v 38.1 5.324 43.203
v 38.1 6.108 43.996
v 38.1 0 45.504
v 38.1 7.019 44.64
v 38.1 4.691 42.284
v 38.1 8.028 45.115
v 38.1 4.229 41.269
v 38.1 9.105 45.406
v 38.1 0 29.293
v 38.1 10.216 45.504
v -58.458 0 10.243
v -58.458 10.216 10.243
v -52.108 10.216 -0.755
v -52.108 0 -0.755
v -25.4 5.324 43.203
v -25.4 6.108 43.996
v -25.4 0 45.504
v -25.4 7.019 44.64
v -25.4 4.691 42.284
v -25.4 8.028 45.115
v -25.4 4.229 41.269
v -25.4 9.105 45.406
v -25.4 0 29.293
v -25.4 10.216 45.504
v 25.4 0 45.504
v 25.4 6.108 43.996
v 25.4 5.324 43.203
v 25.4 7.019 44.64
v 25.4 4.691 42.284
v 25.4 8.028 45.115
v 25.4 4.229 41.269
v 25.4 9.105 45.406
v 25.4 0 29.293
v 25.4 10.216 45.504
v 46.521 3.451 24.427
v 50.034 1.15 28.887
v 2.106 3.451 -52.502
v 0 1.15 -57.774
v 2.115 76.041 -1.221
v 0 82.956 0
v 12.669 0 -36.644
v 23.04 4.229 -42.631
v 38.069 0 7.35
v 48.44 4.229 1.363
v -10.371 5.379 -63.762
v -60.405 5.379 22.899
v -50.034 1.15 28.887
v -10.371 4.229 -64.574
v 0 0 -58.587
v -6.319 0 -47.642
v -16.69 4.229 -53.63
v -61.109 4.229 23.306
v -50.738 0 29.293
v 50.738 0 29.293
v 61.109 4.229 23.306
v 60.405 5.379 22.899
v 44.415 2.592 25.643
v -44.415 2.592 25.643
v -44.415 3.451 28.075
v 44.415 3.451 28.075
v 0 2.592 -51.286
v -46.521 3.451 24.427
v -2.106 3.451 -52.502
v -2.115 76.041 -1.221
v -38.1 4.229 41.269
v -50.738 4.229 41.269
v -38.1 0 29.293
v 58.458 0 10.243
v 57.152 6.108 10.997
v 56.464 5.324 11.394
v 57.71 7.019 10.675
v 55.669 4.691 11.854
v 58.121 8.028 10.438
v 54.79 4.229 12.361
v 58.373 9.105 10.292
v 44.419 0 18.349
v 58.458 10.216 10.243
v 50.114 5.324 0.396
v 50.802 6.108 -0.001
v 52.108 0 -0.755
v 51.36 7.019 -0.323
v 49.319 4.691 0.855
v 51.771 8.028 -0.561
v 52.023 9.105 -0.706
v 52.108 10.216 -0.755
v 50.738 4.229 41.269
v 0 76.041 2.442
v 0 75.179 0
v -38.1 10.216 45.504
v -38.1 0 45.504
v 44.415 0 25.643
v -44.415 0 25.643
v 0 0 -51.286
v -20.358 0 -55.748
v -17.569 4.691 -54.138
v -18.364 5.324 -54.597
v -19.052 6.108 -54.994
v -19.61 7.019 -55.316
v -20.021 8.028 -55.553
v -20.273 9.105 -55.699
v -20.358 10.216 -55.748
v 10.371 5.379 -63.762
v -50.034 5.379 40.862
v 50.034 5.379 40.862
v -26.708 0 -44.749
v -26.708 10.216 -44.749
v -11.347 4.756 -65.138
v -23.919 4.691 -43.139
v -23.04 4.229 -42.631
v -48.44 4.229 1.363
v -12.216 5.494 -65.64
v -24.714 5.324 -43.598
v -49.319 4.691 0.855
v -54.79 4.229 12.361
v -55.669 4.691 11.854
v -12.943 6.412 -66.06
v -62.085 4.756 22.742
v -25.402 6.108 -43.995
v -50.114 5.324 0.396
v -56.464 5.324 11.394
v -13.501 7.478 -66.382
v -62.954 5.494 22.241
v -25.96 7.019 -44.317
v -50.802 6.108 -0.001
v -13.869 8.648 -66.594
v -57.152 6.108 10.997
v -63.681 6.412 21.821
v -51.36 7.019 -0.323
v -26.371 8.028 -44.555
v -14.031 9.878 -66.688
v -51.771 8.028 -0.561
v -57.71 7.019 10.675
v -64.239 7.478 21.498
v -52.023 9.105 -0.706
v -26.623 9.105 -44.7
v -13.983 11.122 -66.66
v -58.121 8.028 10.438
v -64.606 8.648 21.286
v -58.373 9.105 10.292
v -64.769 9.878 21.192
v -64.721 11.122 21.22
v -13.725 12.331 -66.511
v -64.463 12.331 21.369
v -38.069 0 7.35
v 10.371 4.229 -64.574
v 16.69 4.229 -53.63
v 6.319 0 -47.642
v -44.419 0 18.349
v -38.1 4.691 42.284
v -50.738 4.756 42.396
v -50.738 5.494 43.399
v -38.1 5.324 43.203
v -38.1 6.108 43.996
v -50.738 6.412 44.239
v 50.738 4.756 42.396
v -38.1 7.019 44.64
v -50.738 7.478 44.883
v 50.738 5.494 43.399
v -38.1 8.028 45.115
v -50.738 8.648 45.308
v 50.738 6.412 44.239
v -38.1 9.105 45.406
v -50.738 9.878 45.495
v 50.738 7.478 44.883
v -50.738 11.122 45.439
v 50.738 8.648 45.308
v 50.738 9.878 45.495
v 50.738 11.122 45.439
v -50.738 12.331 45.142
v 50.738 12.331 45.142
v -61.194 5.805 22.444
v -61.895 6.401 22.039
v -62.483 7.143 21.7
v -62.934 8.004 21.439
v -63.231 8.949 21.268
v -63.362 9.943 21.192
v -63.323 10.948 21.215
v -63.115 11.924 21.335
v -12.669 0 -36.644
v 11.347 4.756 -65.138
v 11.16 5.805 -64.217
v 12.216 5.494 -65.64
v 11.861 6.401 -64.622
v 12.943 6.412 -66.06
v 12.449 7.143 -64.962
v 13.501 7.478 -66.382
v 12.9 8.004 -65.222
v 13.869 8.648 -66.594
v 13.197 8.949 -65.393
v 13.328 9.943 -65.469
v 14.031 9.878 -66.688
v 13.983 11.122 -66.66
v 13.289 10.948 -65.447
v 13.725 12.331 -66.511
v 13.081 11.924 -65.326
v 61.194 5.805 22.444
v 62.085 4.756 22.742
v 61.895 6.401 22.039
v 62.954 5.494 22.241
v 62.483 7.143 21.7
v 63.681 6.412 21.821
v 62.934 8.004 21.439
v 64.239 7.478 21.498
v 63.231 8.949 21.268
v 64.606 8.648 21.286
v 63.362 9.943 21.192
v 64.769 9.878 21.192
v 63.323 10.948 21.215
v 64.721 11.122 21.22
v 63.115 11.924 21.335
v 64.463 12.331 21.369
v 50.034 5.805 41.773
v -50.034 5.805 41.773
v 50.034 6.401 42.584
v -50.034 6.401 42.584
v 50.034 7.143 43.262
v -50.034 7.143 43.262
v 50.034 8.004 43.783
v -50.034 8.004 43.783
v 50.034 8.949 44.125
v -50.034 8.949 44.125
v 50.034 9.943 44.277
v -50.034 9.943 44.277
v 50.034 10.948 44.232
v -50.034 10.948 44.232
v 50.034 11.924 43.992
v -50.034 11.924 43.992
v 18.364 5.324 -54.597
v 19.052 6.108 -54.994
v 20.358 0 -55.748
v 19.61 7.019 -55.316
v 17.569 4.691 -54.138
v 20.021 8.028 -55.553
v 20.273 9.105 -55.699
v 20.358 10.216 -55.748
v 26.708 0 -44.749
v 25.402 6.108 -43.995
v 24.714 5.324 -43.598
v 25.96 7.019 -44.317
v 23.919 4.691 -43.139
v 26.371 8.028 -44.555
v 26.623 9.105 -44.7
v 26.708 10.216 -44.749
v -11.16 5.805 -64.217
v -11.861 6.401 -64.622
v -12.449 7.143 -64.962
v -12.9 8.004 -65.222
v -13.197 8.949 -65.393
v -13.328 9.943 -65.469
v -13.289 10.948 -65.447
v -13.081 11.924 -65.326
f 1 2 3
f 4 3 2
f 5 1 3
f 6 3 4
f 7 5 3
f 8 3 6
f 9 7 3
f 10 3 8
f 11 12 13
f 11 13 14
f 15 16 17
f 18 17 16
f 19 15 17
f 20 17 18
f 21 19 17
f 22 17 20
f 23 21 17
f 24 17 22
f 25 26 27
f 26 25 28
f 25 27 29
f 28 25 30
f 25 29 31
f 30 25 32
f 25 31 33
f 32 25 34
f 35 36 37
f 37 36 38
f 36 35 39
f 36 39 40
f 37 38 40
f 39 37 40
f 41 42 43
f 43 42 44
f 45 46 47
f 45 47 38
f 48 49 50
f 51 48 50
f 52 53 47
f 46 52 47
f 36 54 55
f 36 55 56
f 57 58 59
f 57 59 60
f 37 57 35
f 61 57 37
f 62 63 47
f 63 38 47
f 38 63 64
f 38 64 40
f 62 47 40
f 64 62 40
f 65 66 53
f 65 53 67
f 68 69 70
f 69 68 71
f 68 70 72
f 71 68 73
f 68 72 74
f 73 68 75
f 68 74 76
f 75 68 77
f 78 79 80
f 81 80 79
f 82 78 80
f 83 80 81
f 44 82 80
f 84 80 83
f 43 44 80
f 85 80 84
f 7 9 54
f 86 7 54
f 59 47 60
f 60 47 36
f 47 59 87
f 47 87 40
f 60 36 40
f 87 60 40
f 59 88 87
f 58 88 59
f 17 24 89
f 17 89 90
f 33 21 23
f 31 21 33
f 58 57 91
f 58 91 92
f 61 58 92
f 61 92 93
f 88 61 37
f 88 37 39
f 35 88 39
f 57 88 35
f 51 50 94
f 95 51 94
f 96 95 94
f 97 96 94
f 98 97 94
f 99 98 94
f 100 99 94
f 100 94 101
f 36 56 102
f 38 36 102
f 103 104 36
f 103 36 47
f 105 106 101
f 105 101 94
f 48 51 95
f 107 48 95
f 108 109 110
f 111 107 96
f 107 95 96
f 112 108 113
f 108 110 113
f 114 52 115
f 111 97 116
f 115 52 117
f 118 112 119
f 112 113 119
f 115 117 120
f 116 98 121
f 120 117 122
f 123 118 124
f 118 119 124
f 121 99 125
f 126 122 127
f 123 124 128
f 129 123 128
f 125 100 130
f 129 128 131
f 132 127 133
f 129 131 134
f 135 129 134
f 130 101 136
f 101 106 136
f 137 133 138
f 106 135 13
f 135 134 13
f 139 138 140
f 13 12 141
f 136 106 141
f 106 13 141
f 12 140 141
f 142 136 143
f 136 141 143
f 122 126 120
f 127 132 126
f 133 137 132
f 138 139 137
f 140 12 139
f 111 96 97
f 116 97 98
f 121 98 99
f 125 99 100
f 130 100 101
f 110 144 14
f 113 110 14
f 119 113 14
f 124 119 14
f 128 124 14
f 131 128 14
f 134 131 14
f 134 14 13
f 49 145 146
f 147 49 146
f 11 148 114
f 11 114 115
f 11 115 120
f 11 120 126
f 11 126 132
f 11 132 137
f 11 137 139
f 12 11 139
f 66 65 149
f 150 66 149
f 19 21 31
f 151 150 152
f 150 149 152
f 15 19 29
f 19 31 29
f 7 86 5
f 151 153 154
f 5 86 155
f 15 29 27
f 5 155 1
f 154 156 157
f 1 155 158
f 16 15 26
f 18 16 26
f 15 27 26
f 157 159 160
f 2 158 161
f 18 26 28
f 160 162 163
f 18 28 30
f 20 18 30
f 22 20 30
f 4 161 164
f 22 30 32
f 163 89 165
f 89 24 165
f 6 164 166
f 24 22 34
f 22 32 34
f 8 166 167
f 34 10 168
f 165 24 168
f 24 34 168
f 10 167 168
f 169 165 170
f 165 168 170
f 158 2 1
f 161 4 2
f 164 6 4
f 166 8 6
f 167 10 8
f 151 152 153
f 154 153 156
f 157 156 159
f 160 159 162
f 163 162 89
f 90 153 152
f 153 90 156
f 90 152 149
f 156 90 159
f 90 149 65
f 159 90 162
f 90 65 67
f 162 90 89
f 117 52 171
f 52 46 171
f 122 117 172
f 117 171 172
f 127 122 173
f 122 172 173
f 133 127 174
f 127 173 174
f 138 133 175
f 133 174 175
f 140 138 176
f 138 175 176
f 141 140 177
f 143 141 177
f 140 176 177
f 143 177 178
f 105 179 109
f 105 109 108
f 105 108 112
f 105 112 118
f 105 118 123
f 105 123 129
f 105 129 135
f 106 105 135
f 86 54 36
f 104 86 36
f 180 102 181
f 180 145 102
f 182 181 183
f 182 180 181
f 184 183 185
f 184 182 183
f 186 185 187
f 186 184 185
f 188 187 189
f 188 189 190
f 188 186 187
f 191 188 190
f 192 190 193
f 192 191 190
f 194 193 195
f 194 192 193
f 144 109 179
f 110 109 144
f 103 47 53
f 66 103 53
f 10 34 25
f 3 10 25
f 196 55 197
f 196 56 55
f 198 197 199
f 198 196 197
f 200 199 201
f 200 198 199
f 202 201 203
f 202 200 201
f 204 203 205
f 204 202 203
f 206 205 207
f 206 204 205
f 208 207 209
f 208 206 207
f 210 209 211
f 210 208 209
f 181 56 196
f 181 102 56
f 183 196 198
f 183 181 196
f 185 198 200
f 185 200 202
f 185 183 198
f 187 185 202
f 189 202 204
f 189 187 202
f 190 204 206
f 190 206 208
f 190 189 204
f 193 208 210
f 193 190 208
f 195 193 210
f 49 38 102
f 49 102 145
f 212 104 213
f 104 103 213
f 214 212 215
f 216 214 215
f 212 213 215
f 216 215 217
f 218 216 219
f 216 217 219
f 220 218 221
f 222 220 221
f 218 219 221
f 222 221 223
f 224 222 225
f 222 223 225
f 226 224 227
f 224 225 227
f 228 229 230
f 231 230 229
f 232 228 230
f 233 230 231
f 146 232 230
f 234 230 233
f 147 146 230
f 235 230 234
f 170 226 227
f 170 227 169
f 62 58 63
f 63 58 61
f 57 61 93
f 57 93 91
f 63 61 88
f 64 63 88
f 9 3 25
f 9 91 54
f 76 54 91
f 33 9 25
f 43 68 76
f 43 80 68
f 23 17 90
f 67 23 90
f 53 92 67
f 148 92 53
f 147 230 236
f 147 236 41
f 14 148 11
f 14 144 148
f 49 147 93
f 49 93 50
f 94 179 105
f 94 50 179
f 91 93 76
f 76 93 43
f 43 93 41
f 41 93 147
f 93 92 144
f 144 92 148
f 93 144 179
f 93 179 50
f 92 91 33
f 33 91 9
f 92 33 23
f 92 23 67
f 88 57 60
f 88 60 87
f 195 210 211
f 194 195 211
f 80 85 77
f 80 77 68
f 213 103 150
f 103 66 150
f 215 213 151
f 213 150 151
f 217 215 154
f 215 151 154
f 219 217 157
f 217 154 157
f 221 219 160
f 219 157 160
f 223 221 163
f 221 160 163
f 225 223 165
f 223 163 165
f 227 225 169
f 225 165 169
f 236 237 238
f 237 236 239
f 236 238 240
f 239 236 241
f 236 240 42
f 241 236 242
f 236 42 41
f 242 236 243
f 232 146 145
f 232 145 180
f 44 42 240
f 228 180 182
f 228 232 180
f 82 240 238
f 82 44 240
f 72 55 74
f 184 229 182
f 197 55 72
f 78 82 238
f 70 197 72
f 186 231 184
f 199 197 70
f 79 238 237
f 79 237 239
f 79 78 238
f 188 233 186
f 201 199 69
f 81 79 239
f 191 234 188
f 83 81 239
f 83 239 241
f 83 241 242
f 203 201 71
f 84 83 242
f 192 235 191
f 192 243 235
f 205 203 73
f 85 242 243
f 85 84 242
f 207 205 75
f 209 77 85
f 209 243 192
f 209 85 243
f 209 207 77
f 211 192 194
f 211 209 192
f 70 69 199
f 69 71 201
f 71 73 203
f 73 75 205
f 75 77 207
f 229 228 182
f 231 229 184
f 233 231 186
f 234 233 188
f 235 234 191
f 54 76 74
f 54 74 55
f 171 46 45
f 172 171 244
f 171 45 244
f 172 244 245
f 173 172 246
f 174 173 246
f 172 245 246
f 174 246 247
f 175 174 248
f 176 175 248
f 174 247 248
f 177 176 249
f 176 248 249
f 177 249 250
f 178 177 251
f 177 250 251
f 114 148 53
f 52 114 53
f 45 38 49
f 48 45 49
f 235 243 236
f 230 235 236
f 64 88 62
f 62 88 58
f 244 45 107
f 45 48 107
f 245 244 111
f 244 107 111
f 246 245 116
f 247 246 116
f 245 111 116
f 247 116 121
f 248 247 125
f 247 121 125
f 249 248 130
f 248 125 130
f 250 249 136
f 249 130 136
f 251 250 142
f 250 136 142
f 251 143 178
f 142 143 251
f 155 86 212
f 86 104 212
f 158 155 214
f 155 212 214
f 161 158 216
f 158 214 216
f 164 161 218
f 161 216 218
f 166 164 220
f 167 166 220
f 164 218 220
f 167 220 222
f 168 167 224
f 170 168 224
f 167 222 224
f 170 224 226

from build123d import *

# Parameters (mm, degrees)
BOSS_EXTRUDE1_DEPTH  = 82.956052622
CHAMFER1_SIZE        = 83.058
CHAMFER1_SIZE_2      = 29.329393675
BOSS_EXTRUDE3_START  = 2.592376644
BOSS_EXTRUDE3_DEPTH  = 72.586546044
CHAMFER6_SIZE        = 72.644
CHAMFER6_SIZE_2      = 25.663219438
BOSS_EXTRUDE19_DEPTH = 25.4
BOSS_EXTRUDE20_DEPTH = 25.4
BOSS_EXTRUDE21_DEPTH = 25.4
BOSS_EXTRUDE23_DEPTH = 25.4
BOSS_EXTRUDE26_START = 38.1
BOSS_EXTRUDE26_DEPTH = 12.7
BOSS_EXTRUDE27_START = -25.4
BOSS_EXTRUDE27_DEPTH = 12.7
MIRROR2_START        = 38.1
MIRROR2_COPY_2_DEPTH = 12.7
MIRROR2_START_2      = -25.4
MIRROR2_COPY_3_DEPTH = 12.7
MIRROR2_COPY_5_DEPTH = 12.7
MIRROR2_COPY_6_DEPTH = 12.7


with BuildPart() as part:
    # Sketch1 → Boss-Extrude1 (new body)
    with BuildSketch(Plane(origin=(0, 0, 0), x_dir=(1, 0, 0), z_dir=(0, 1, 0))):
        Polygon((-50.8, -29.329393675), (0, 58.65878735), (50.8, -29.329393675), align=None)
    extrude(amount=BOSS_EXTRUDE1_DEPTH)

    # Chamfer1
    # the kernel refuses this chamfer: 83.058, 29.329393675 mm, written as the material it takes off along each edge
    with BuildSketch(Plane(origin=(-158.547298904, 82.956052622, 215.953189756), x_dir=(-0.011114252752895883, -0.9999176455327007, -0.006416816818725978), z_dir=(0.5000000000000001, 0, -0.8660254037844387)), Plane(origin=(266.294597809, 82.956052622, 29.329393675), x_dir=(0, -0.9999176455327007, 0.012833633637452178), z_dir=(-1, 0, 0)), Plane(origin=(-107.747298904, 82.956052622, -245.28258343), x_dir=(0.011114252752896008, -0.9999176455327007, -0.006416816818726048), z_dir=(0.49999999999999994, 0, 0.8660254037844387))) as chamfer1_piece_1:
        Polygon((CHAMFER1_SIZE * 0.999917645533, -CHAMFER1_SIZE * 0.0128336336375), (-CHAMFER1_SIZE_2 * 0.0128336336374, -CHAMFER1_SIZE_2 * 0.999917645527), (0, 0), align=None)
    extrude(amount=532.589195618, mode=Mode.SUBTRACT)


with BuildPart() as body_2:
    # Sketch2 → Boss-Extrude3 (new body)
    with BuildSketch(Plane(origin=(0, 0, 0), x_dir=(1, 0, 0), z_dir=(0, 1, 0)).offset(BOSS_EXTRUDE3_START)):
        Polygon((-44.45, -25.663219465), (0, 51.326438931), (44.45, -25.663219465), align=None)
    extrude(amount=BOSS_EXTRUDE3_DEPTH)

    # Chamfer6
    # the kernel refuses this chamfer: 72.644, 25.663219438 mm, written as the material it takes off along each edge
    with BuildSketch(Plane(origin=(-94.237538797, 75.178922689, -214.550644108), x_dir=(0.011118590367512081, -0.9999175812357334, -0.0064193211416922824), z_dir=(0.5000000000000001, 0, 0.8660254037844386)), Plane(origin=(-138.687538797, 75.178922689, 188.887424643), x_dir=(-0.011118590367511921, -0.9999175812357334, -0.006419321141692186), z_dir=(0.49999999999999994, 0, -0.8660254037844387)), Plane(origin=(232.925077595, 75.178922689, 25.663219465), x_dir=(0, -0.9999175812357332, 0.012838642283384548), z_dir=(-1, 0, 0))) as chamfer6_piece_1:
        Polygon((CHAMFER6_SIZE * 0.999917581236, -CHAMFER6_SIZE * 0.0128386422834), (-CHAMFER6_SIZE_2 * 0.0128386422834, -CHAMFER6_SIZE_2 * 0.999917581236), (0, 0), align=None)
    extrude(amount=465.850155189, mode=Mode.SUBTRACT)

    # Sketch19 → Boss-Extrude19 (add)
    with BuildSketch(Plane(origin=(0, 8.341471254, 23.611918188), x_dir=(1, 0, 0), z_dir=(0, 0.3330989621400992, 0.9428918715426434))):
        Polygon((0, 70.885595133), (-44.414844608, -6.097300002), (44.414844608, -6.097300002), align=None)
    extrude(amount=BOSS_EXTRUDE19_DEPTH)

    # Sketch20 → Boss-Extrude20 (add)
    with BuildSketch(Plane(origin=(-20.448520983, 8.341471254, -11.805959094), x_dir=(-0.43652342739361594, 0.1780689969978707, 0.8818949651997697), z_dir=(-0.8165683137777828, 0.3330989621400992, -0.47144593577132166))):
        Polygon((13.387035379, 69.610019986), (42.464106341, -14.375505607), (-44.767106565, 2.400345516), align=None)
    extrude(amount=BOSS_EXTRUDE20_DEPTH)

    # Sketch21 → Boss-Extrude21 (add)
    with BuildSketch(Plane(origin=(20.448520983, 8.341471254, -11.805959094), x_dir=(-0.43652342739361605, -0.1780689969978708, -0.8818949651997696), z_dir=(0.8165683137777828, 0.3330989621400991, -0.47144593577132177))):
        Polygon((-13.387035361, 69.610020002), (-42.464106341, -14.375505607), (44.767106565, 2.400345516), align=None)
    extrude(amount=BOSS_EXTRUDE21_DEPTH)

    # Sketch22 → Boss-Extrude23 (add)
    with BuildSketch(Plane.XZ.offset(-2.592376644)):
        Polygon((44.414844608, 25.64292249), (-44.414844608, 25.64292249), (0, -51.285844981), align=None)
    extrude(amount=BOSS_EXTRUDE23_DEPTH)


with BuildPart() as part_1:
    add(part.part)

    # Combine3: cut body 2
    add(body_2.part, mode=Mode.SUBTRACT)

    # Sweep2: sweep along a path in Sketch25
    with BuildLine(Plane(origin=(0, 0, 0), x_dir=(0, 0, -1), z_dir=(1, 0, 0))) as sweep2_path:
        Line((-29.293394075, 0), (-41.26870121, 4.228713638))
        ThreePointArc((-41.26870121, 4.228713638), (-44.883330876, 7.477532809), (-45.141997958, 12.330724024))
    # Sketch24 → Sweep2 (sweep)
    with BuildSketch(Plane(origin=(0, 9.197233007, 26.045672391), x_dir=(1, 0, 0), z_dir=(0, 0.33296957778049097, 0.9429375696580775))):
        Polygon((-50.737646864, -9.753809057), (50.737646864, -9.753809057), (50.03399067, -8.533709325), (-50.03399067, -8.533709325), align=None)
    sweep2 = sweep(path=sweep2_path.line)

    # Sketch26 → Boss-Extrude26 (add)
    with BuildSketch(Plane(origin=(0, 0, 0), x_dir=(0, 0, -1), z_dir=(1, 0, 0)).offset(BOSS_EXTRUDE26_START)):
        with BuildLine():
            Line((-45.504344391, 10.216367205), (-45.504344391, 0))
            Line((-45.504344391, 0), (-29.293394075, 0))
            Line((-29.293394075, 0), (-41.26870121, 4.228713638))
            ThreePointArc((-41.26870121, 4.228713638), (-44.338390388, 6.549192939), (-45.504344391, 10.216367205))
        make_face()
    boss_extrude26 = extrude(amount=-BOSS_EXTRUDE26_DEPTH)

    # Sketch26<7> → Boss-Extrude27 (add)
    with BuildSketch(Plane(origin=(0, 0, 0), x_dir=(0, 0, -1), z_dir=(1, 0, 0)).offset(BOSS_EXTRUDE27_START)):
        with BuildLine():
            Line((-45.504344391, 10.216367205), (-45.504344391, 0))
            Line((-45.504344391, 0), (-29.293394075, 0))
            Line((-29.293394075, 0), (-41.26870121, 4.228713638))
            ThreePointArc((-41.26870121, 4.228713638), (-44.338390388, 6.549192939), (-45.504344391, 10.216367205))
        make_face()
    boss_extrude27 = extrude(amount=-BOSS_EXTRUDE27_DEPTH)

    # Mirror1: Sweep2, Boss-Extrude26, Boss-Extrude27 across plane
    add(sweep2.mirror(Plane(origin=(0, 0, 0), x_dir=(0.8660254037844387, 0, 0.49999999999999994), z_dir=(-0.49999999999999983, 0, 0.8660254037844387))))
    add(boss_extrude26.mirror(Plane(origin=(0, 0, 0), x_dir=(0.8660254037844387, 0, 0.49999999999999994), z_dir=(-0.49999999999999983, 0, 0.8660254037844387))))
    add(boss_extrude27.mirror(Plane(origin=(0, 0, 0), x_dir=(0.8660254037844387, 0, 0.49999999999999994), z_dir=(-0.49999999999999983, 0, 0.8660254037844387))))

    # Mirror2 copy 1: sweep along a path in Mirror2 copy 1 path
    with BuildLine(Plane(origin=(0, 0, 0), x_dir=(-0.8660254037844385, 0, 0.5), z_dir=(-0.5000000000000001, 0, -0.8660254037844388))) as mirror2_copy_1_path:
        Line((-29.293394075, 0), (-41.26870121, 4.228713638))
        ThreePointArc((-41.26870121, 4.228713638), (-44.883330876, 7.477532809), (-45.141997958, 12.330724024))
    # Mirror2 copy 1 sketch → Mirror2 copy 1 (sweep)
    with BuildSketch(Plane(origin=(22.55621395, 9.197233007, -13.022836196), x_dir=(-0.5000000000000001, 0, -0.8660254037844388), z_dir=(0.8166078895066538, 0.33296957778049074, -0.4714687848290388))):
        Polygon((-50.737646864, -9.753809057), (50.737646864, -9.753809057), (50.03399067, -8.533709325), (-50.03399067, -8.533709325), align=None)
    sweep(path=mirror2_copy_1_path.line)

    # Mirror2 copy 2 sketch → Mirror2 copy 2 (add)
    with BuildSketch(Plane(origin=(0, 0, 0), x_dir=(-0.8660254037844385, 0, 0.5), z_dir=(-0.5000000000000001, 0, -0.8660254037844388)).offset(MIRROR2_START)):
        with BuildLine():
            Line((-45.504344391, 10.216367205), (-45.504344391, 0))
            Line((-45.504344391, 0), (-29.293394075, 0))
            Line((-29.293394075, 0), (-41.26870121, 4.228713638))
            ThreePointArc((-41.26870121, 4.228713638), (-44.338390388, 6.549192939), (-45.504344391, 10.216367205))
        make_face()
    extrude(amount=-MIRROR2_COPY_2_DEPTH)

    # Mirror2 copy 3 sketch → Mirror2 copy 3 (add)
    with BuildSketch(Plane(origin=(0, 0, 0), x_dir=(-0.8660254037844385, 0, 0.5), z_dir=(-0.5000000000000001, 0, -0.8660254037844388)).offset(MIRROR2_START_2)):
        with BuildLine():
            Line((-45.504344391, 10.216367205), (-45.504344391, 0))
            Line((-45.504344391, 0), (-29.293394075, 0))
            Line((-29.293394075, 0), (-41.26870121, 4.228713638))
            ThreePointArc((-41.26870121, 4.228713638), (-44.338390388, 6.549192939), (-45.504344391, 10.216367205))
        make_face()
    extrude(amount=-MIRROR2_COPY_3_DEPTH)

    # Mirror2 copy 4: sweep along a path in Mirror2 copy 4 path
    with BuildLine(Plane(origin=(0, 0, 0), x_dir=(0.8660254037844389, 0, 0.4999999999999998), z_dir=(0.49999999999999956, 0, -0.8660254037844389))) as mirror2_copy_4_path:
        Line((-29.293394075, 0), (-41.26870121, -4.228713638))
        ThreePointArc((-41.26870121, -4.228713638), (-44.883330876, -7.477532809), (-45.141997958, -12.330724024))
    # Mirror2 copy 4 sketch → Mirror2 copy 4 (sweep)
    with BuildSketch(Plane(origin=(-22.55621395, 9.197233007, -13.022836196), x_dir=(0.49999999999999956, 0, -0.8660254037844389), z_dir=(-0.8166078895066541, 0.33296957778049086, -0.4714687848290386))):
        Polygon((-50.737646864, 9.753809057), (50.737646864, 9.753809057), (50.03399067, 8.533709325), (-50.03399067, 8.533709325), align=None)
    sweep(path=mirror2_copy_4_path.line)

    # Mirror2 copy 5 sketch → Mirror2 copy 5 (add)
    with BuildSketch(Plane(origin=(0, 0, 0), x_dir=(0.8660254037844389, 0, 0.4999999999999998), z_dir=(0.49999999999999956, 0, -0.8660254037844389)).offset(MIRROR2_START)):
        with BuildLine():
            Line((-45.504344391, -10.216367205), (-45.504344391, 0))
            Line((-45.504344391, 0), (-29.293394075, 0))
            Line((-29.293394075, 0), (-41.26870121, -4.228713638))
            ThreePointArc((-41.26870121, -4.228713638), (-44.338390388, -6.549192939), (-45.504344391, -10.216367205))
        make_face()
    extrude(amount=-MIRROR2_COPY_5_DEPTH)

    # Mirror2 copy 6 sketch → Mirror2 copy 6 (add)
    with BuildSketch(Plane(origin=(0, 0, 0), x_dir=(0.8660254037844389, 0, 0.4999999999999998), z_dir=(0.49999999999999956, 0, -0.8660254037844389)).offset(MIRROR2_START_2)):
        with BuildLine():
            Line((-45.504344391, -10.216367205), (-45.504344391, 0))
            Line((-45.504344391, 0), (-29.293394075, 0))
            Line((-29.293394075, 0), (-41.26870121, -4.228713638))
            ThreePointArc((-41.26870121, -4.228713638), (-44.338390388, -6.549192939), (-45.504344391, -10.216367205))
        make_face()
    extrude(amount=-MIRROR2_COPY_6_DEPTH)


solid = part_1.part
